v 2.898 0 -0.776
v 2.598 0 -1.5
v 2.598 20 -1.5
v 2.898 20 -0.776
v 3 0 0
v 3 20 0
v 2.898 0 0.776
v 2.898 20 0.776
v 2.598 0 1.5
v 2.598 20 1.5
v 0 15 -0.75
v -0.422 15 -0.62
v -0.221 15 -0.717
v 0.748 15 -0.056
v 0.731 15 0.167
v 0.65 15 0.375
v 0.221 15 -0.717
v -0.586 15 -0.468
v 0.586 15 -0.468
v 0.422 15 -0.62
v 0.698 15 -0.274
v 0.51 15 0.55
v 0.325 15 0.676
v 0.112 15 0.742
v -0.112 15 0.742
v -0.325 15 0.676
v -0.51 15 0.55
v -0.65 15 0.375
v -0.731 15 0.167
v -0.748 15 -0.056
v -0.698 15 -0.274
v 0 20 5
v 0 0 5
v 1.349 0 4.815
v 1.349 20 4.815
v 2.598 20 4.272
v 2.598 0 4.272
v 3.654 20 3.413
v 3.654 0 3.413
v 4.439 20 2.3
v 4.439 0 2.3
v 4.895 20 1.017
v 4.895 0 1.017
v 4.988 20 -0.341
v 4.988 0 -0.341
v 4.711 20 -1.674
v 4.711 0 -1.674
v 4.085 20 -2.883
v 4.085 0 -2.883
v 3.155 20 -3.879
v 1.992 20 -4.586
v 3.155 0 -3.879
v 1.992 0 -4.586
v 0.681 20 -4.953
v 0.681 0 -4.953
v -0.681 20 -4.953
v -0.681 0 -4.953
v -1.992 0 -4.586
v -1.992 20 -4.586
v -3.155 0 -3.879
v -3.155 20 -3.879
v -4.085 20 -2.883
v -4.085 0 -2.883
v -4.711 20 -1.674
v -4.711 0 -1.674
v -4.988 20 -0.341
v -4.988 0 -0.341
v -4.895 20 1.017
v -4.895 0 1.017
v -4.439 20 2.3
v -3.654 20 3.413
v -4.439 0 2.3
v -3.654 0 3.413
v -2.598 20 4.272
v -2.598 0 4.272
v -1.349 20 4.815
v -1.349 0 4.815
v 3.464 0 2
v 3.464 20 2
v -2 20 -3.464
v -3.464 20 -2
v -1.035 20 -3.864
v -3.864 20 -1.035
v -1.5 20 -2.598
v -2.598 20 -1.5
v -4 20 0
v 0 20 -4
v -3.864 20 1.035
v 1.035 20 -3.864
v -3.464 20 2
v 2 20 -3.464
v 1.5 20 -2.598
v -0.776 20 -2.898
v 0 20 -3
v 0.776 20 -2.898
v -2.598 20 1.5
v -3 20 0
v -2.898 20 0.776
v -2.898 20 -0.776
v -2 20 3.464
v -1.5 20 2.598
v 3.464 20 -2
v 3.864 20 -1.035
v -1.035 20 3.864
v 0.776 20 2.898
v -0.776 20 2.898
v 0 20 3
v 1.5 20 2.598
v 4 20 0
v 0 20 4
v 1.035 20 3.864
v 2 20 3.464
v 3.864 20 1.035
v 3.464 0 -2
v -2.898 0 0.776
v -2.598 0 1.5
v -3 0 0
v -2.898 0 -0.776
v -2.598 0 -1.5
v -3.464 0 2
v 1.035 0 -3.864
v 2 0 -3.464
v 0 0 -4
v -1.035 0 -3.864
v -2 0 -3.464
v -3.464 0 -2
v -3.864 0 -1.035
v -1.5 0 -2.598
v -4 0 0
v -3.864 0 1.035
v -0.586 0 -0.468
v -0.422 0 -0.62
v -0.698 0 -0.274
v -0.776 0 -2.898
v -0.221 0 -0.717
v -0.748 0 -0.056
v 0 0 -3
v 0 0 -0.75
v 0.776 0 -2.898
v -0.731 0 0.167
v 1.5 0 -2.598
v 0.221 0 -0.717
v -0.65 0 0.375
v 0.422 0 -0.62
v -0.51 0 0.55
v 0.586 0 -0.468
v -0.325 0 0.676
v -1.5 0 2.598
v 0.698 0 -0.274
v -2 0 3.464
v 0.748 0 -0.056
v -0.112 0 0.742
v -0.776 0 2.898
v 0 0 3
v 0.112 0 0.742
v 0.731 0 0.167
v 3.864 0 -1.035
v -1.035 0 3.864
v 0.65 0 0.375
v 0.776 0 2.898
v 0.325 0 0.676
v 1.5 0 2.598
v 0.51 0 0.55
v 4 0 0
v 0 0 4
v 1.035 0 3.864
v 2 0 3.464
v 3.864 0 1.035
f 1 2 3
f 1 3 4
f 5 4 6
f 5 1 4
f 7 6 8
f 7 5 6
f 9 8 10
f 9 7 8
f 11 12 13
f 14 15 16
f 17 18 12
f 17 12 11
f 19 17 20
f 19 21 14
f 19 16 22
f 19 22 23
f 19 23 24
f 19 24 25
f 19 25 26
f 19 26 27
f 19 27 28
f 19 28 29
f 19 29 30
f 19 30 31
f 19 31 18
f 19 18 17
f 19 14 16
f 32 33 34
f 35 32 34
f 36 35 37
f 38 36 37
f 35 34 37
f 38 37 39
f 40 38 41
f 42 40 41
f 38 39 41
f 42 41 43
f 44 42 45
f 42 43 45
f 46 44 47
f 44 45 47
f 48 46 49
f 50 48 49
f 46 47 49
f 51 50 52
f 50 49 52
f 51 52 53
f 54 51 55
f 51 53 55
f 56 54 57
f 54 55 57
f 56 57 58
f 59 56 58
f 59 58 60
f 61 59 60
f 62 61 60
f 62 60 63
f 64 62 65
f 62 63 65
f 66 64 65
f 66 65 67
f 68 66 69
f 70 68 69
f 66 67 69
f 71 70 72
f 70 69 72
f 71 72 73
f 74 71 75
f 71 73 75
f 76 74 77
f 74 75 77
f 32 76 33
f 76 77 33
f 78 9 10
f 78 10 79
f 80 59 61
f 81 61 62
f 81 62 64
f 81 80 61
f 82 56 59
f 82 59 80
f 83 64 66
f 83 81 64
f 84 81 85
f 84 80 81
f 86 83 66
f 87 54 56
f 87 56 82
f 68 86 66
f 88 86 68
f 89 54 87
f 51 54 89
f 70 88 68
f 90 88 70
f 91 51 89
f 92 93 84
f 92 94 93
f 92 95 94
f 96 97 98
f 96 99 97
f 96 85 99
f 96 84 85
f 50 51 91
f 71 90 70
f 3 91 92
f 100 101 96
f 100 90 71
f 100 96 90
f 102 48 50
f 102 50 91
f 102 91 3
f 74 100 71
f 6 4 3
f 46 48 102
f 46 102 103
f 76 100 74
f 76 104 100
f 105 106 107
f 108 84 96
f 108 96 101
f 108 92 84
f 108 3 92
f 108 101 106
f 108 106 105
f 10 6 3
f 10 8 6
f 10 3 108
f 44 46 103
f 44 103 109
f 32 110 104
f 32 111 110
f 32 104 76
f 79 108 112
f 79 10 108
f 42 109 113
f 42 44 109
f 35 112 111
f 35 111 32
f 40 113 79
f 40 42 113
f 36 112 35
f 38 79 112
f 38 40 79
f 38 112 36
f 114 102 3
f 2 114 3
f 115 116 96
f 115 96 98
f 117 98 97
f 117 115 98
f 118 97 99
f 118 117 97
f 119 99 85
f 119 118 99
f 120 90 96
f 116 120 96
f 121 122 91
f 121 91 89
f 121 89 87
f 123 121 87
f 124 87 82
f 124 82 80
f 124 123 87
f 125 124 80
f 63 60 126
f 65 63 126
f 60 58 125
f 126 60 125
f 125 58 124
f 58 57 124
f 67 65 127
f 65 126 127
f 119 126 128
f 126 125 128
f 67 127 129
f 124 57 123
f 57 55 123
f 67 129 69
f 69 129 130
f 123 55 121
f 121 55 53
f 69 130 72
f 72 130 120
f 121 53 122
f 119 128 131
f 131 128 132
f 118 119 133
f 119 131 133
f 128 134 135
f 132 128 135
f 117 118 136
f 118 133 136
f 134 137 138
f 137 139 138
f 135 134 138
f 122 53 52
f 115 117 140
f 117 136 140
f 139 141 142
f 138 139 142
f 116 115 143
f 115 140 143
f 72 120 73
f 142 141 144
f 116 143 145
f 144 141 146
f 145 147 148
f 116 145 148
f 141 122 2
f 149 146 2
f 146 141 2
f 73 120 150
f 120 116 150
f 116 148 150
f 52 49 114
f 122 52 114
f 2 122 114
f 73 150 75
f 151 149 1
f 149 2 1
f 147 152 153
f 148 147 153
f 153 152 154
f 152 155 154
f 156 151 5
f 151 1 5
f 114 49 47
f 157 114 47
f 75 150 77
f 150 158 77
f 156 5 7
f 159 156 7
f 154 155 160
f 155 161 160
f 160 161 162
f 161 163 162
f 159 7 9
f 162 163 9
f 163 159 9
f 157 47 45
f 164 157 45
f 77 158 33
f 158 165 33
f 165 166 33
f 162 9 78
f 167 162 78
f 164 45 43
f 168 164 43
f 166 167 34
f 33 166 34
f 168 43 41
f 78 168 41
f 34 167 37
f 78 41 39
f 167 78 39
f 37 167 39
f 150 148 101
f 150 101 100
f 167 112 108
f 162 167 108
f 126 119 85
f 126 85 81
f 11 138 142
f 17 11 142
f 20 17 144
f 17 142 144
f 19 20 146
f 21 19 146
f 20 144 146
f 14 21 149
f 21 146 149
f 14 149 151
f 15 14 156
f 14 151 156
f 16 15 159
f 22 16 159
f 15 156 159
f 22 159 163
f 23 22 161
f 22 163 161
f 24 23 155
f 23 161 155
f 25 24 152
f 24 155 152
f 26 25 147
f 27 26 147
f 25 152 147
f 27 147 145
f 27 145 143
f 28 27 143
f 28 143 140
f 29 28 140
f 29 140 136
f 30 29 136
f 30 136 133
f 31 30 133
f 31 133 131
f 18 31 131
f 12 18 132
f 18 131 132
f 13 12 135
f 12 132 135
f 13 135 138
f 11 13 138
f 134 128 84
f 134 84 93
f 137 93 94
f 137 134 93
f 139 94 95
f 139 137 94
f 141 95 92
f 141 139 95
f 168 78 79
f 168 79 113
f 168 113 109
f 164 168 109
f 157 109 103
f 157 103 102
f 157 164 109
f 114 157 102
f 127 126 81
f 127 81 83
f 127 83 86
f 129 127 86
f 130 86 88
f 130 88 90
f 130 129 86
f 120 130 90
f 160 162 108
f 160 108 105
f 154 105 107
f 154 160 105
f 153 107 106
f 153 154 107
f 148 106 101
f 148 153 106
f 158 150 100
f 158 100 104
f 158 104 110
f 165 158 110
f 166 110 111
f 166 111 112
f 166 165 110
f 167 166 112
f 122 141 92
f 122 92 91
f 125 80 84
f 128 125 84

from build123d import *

# Parameters (mm, degrees)
SKETCH1_R           = 5
BOSS_EXTRUDE1_DEPTH = 20
SKETCH2_R           = 0.75
CUT_EXTRUDE1_DEPTH  = 15


with BuildPart() as part:
    # Sketch1 → Boss-Extrude1 (new body)
    with BuildSketch(Plane(origin=(0, 0, 0), x_dir=(1, 0, 0), z_dir=(0, 1, 0))):
        with Locations(Location((0, 0, 0), (0, 0, 270))):
            Circle(SKETCH1_R)
        with BuildLine():
            Line((-2, 3.464101615), (-1.5, 2.598076211))
            ThreePointArc((-1.5, 2.598076211), (0, 3), (1.5, 2.598076211))
            Line((1.5, 2.598076211), (2, 3.464101615))
            ThreePointArc((2, 3.464101615), (0, 4), (-2, 3.464101615))
        make_face(mode=Mode.SUBTRACT)
        with BuildLine():
            Line((2.598076211, -1.5), (3.464101615, -2))
            ThreePointArc((3.464101615, -2), (4, 0), (3.464101615, 2))
            Line((3.464101615, 2), (2.598076211, 1.5))
            ThreePointArc((2.598076211, 1.5), (3, 0), (2.598076211, -1.5))
        make_face(mode=Mode.SUBTRACT)
        with BuildLine():
            Line((-1.5, -2.598076211), (-2, -3.464101615))
            ThreePointArc((-2, -3.464101615), (0, -4), (2, -3.464101615))
            Line((2, -3.464101615), (1.5, -2.598076211))
            ThreePointArc((1.5, -2.598076211), (0, -3), (-1.5, -2.598076211))
        make_face(mode=Mode.SUBTRACT)
        with BuildLine():
            Line((-2.598076211, 1.5), (-3.464101615, 2))
            ThreePointArc((-3.464101615, 2), (-4, 0), (-3.464101615, -2))
            Line((-3.464101615, -2), (-2.598076211, -1.5))
            ThreePointArc((-2.598076211, -1.5), (-3, 0), (-2.598076211, 1.5))
        make_face(mode=Mode.SUBTRACT)
    extrude(amount=BOSS_EXTRUDE1_DEPTH)

    # Sketch2 → Cut-Extrude1 (cut)
    with BuildSketch(Plane.XZ):
        with Locations(Location((0, 0, 0), (0, 0, 270))):
            Circle(SKETCH2_R)
    extrude(amount=-CUT_EXTRUDE1_DEPTH, mode=Mode.SUBTRACT)


solid = part.part
